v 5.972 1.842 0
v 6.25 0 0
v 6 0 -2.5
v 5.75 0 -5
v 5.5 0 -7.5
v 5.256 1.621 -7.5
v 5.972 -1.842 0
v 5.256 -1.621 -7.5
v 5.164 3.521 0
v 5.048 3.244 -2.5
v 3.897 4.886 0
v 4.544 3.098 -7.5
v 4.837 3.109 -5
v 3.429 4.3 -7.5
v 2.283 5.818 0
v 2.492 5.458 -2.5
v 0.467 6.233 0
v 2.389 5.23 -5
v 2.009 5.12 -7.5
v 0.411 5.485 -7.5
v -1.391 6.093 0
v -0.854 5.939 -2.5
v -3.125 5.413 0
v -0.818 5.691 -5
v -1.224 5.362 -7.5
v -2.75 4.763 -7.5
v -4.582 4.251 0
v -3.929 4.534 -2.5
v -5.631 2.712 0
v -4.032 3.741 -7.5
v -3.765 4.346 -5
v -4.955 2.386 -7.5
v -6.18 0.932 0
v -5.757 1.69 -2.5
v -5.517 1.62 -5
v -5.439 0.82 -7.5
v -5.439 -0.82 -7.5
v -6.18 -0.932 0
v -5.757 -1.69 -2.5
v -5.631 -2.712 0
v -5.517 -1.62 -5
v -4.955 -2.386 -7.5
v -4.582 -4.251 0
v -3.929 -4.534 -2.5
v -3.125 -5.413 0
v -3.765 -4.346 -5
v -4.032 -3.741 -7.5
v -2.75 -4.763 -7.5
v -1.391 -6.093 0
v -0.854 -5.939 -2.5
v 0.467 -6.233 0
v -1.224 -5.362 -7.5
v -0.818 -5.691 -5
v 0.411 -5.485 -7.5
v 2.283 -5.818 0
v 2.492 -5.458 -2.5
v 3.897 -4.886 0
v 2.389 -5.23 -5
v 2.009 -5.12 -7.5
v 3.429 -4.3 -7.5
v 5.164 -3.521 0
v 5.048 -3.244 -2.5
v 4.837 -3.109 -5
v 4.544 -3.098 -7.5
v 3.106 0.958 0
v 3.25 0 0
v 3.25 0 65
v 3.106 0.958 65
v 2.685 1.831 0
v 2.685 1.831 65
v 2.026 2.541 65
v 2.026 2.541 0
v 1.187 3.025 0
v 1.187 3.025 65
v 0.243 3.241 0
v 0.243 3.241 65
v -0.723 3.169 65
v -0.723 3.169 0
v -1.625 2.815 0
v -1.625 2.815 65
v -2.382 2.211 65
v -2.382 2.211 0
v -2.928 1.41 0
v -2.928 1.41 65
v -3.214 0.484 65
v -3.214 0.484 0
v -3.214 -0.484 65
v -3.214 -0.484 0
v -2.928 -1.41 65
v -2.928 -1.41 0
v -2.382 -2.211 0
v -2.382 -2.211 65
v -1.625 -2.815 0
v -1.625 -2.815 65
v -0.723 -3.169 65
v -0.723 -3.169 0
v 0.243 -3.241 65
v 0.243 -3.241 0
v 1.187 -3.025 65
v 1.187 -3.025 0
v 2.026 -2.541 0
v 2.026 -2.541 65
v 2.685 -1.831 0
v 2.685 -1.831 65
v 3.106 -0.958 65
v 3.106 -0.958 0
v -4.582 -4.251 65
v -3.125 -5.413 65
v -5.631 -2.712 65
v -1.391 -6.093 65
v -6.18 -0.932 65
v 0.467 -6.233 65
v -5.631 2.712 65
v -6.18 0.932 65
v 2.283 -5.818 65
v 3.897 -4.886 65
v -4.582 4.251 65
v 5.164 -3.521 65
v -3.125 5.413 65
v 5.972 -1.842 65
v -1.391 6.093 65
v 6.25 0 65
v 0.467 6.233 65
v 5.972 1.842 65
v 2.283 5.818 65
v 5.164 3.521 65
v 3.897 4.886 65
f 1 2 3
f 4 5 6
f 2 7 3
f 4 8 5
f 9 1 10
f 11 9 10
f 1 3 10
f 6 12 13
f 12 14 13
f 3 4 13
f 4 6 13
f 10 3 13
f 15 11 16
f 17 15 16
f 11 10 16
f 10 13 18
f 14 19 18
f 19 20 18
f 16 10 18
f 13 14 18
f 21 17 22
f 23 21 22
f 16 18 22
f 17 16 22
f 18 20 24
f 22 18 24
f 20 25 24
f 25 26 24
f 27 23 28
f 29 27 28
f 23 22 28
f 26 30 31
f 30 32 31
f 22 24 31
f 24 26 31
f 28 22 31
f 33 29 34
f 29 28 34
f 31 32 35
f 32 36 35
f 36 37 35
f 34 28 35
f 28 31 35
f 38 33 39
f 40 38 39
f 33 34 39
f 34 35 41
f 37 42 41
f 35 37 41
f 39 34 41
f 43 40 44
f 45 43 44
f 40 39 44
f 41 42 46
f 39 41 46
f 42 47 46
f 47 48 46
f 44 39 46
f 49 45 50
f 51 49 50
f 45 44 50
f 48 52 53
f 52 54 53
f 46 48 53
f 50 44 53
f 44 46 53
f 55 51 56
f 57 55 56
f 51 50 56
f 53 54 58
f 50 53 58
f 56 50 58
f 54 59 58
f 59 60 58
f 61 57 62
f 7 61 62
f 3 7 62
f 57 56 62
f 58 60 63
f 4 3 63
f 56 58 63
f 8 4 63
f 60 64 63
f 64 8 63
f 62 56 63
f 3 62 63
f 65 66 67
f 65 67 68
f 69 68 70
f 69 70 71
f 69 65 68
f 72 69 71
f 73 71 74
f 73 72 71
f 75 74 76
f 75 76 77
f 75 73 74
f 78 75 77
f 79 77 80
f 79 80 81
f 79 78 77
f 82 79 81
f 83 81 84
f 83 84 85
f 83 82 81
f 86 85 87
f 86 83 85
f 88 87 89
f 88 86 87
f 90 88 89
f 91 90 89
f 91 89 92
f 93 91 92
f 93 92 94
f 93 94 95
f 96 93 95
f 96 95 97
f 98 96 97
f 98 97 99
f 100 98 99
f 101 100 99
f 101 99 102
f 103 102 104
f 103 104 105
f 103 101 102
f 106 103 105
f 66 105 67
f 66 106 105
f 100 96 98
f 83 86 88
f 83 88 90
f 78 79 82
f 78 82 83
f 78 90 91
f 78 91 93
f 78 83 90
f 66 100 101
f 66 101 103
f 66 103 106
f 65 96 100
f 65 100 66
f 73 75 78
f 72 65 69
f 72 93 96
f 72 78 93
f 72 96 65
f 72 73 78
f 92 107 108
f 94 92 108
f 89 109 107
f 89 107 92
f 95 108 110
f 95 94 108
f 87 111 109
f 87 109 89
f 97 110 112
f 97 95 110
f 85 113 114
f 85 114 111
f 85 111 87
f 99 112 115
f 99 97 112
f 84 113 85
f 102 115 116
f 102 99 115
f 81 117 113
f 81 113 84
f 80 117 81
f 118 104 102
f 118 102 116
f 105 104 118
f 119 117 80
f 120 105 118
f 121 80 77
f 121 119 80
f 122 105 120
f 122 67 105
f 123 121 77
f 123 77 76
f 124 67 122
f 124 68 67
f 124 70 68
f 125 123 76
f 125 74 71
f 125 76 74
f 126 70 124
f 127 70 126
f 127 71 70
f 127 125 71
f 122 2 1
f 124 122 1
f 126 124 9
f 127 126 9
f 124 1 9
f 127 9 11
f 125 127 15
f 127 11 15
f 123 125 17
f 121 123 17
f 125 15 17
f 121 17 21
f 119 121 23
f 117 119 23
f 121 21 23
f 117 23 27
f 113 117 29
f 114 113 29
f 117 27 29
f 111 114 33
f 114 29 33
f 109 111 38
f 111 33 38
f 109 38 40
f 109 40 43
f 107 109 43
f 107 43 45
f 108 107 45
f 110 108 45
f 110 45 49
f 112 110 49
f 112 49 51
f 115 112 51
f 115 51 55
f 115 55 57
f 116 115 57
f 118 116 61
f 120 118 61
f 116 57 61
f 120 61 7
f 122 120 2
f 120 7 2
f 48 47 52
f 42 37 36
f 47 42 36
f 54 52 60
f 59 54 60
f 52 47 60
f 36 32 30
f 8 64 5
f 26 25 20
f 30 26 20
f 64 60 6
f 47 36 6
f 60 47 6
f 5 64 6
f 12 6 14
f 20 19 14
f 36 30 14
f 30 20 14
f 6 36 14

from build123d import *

# Parameters (mm, degrees)
F0_R     = 6.25
F3_R     = 5.5
F5_DEPTH = 65
F1_R     = 3.25
F6_DEPTH = 65


with BuildPart() as f4:
    # F0 (on Top) → F4 section 0
    with BuildSketch(Plane.XY):
        Circle(F0_R)
    # F3 (on offset) → F4 section 1
    with BuildSketch(Plane.XY.offset(-7.5)):
        Circle(F3_R)
    loft()

    # F0 (on Top) → F5 (join)
    with BuildSketch(Plane.XY):
        Circle(F0_R)
    extrude(amount=F5_DEPTH)

    # F1 (on Top) → F6 (cut)
    with BuildSketch(Plane.XY):
        Circle(F1_R)
    extrude(amount=F6_DEPTH, mode=Mode.SUBTRACT)


solid = f4.part
